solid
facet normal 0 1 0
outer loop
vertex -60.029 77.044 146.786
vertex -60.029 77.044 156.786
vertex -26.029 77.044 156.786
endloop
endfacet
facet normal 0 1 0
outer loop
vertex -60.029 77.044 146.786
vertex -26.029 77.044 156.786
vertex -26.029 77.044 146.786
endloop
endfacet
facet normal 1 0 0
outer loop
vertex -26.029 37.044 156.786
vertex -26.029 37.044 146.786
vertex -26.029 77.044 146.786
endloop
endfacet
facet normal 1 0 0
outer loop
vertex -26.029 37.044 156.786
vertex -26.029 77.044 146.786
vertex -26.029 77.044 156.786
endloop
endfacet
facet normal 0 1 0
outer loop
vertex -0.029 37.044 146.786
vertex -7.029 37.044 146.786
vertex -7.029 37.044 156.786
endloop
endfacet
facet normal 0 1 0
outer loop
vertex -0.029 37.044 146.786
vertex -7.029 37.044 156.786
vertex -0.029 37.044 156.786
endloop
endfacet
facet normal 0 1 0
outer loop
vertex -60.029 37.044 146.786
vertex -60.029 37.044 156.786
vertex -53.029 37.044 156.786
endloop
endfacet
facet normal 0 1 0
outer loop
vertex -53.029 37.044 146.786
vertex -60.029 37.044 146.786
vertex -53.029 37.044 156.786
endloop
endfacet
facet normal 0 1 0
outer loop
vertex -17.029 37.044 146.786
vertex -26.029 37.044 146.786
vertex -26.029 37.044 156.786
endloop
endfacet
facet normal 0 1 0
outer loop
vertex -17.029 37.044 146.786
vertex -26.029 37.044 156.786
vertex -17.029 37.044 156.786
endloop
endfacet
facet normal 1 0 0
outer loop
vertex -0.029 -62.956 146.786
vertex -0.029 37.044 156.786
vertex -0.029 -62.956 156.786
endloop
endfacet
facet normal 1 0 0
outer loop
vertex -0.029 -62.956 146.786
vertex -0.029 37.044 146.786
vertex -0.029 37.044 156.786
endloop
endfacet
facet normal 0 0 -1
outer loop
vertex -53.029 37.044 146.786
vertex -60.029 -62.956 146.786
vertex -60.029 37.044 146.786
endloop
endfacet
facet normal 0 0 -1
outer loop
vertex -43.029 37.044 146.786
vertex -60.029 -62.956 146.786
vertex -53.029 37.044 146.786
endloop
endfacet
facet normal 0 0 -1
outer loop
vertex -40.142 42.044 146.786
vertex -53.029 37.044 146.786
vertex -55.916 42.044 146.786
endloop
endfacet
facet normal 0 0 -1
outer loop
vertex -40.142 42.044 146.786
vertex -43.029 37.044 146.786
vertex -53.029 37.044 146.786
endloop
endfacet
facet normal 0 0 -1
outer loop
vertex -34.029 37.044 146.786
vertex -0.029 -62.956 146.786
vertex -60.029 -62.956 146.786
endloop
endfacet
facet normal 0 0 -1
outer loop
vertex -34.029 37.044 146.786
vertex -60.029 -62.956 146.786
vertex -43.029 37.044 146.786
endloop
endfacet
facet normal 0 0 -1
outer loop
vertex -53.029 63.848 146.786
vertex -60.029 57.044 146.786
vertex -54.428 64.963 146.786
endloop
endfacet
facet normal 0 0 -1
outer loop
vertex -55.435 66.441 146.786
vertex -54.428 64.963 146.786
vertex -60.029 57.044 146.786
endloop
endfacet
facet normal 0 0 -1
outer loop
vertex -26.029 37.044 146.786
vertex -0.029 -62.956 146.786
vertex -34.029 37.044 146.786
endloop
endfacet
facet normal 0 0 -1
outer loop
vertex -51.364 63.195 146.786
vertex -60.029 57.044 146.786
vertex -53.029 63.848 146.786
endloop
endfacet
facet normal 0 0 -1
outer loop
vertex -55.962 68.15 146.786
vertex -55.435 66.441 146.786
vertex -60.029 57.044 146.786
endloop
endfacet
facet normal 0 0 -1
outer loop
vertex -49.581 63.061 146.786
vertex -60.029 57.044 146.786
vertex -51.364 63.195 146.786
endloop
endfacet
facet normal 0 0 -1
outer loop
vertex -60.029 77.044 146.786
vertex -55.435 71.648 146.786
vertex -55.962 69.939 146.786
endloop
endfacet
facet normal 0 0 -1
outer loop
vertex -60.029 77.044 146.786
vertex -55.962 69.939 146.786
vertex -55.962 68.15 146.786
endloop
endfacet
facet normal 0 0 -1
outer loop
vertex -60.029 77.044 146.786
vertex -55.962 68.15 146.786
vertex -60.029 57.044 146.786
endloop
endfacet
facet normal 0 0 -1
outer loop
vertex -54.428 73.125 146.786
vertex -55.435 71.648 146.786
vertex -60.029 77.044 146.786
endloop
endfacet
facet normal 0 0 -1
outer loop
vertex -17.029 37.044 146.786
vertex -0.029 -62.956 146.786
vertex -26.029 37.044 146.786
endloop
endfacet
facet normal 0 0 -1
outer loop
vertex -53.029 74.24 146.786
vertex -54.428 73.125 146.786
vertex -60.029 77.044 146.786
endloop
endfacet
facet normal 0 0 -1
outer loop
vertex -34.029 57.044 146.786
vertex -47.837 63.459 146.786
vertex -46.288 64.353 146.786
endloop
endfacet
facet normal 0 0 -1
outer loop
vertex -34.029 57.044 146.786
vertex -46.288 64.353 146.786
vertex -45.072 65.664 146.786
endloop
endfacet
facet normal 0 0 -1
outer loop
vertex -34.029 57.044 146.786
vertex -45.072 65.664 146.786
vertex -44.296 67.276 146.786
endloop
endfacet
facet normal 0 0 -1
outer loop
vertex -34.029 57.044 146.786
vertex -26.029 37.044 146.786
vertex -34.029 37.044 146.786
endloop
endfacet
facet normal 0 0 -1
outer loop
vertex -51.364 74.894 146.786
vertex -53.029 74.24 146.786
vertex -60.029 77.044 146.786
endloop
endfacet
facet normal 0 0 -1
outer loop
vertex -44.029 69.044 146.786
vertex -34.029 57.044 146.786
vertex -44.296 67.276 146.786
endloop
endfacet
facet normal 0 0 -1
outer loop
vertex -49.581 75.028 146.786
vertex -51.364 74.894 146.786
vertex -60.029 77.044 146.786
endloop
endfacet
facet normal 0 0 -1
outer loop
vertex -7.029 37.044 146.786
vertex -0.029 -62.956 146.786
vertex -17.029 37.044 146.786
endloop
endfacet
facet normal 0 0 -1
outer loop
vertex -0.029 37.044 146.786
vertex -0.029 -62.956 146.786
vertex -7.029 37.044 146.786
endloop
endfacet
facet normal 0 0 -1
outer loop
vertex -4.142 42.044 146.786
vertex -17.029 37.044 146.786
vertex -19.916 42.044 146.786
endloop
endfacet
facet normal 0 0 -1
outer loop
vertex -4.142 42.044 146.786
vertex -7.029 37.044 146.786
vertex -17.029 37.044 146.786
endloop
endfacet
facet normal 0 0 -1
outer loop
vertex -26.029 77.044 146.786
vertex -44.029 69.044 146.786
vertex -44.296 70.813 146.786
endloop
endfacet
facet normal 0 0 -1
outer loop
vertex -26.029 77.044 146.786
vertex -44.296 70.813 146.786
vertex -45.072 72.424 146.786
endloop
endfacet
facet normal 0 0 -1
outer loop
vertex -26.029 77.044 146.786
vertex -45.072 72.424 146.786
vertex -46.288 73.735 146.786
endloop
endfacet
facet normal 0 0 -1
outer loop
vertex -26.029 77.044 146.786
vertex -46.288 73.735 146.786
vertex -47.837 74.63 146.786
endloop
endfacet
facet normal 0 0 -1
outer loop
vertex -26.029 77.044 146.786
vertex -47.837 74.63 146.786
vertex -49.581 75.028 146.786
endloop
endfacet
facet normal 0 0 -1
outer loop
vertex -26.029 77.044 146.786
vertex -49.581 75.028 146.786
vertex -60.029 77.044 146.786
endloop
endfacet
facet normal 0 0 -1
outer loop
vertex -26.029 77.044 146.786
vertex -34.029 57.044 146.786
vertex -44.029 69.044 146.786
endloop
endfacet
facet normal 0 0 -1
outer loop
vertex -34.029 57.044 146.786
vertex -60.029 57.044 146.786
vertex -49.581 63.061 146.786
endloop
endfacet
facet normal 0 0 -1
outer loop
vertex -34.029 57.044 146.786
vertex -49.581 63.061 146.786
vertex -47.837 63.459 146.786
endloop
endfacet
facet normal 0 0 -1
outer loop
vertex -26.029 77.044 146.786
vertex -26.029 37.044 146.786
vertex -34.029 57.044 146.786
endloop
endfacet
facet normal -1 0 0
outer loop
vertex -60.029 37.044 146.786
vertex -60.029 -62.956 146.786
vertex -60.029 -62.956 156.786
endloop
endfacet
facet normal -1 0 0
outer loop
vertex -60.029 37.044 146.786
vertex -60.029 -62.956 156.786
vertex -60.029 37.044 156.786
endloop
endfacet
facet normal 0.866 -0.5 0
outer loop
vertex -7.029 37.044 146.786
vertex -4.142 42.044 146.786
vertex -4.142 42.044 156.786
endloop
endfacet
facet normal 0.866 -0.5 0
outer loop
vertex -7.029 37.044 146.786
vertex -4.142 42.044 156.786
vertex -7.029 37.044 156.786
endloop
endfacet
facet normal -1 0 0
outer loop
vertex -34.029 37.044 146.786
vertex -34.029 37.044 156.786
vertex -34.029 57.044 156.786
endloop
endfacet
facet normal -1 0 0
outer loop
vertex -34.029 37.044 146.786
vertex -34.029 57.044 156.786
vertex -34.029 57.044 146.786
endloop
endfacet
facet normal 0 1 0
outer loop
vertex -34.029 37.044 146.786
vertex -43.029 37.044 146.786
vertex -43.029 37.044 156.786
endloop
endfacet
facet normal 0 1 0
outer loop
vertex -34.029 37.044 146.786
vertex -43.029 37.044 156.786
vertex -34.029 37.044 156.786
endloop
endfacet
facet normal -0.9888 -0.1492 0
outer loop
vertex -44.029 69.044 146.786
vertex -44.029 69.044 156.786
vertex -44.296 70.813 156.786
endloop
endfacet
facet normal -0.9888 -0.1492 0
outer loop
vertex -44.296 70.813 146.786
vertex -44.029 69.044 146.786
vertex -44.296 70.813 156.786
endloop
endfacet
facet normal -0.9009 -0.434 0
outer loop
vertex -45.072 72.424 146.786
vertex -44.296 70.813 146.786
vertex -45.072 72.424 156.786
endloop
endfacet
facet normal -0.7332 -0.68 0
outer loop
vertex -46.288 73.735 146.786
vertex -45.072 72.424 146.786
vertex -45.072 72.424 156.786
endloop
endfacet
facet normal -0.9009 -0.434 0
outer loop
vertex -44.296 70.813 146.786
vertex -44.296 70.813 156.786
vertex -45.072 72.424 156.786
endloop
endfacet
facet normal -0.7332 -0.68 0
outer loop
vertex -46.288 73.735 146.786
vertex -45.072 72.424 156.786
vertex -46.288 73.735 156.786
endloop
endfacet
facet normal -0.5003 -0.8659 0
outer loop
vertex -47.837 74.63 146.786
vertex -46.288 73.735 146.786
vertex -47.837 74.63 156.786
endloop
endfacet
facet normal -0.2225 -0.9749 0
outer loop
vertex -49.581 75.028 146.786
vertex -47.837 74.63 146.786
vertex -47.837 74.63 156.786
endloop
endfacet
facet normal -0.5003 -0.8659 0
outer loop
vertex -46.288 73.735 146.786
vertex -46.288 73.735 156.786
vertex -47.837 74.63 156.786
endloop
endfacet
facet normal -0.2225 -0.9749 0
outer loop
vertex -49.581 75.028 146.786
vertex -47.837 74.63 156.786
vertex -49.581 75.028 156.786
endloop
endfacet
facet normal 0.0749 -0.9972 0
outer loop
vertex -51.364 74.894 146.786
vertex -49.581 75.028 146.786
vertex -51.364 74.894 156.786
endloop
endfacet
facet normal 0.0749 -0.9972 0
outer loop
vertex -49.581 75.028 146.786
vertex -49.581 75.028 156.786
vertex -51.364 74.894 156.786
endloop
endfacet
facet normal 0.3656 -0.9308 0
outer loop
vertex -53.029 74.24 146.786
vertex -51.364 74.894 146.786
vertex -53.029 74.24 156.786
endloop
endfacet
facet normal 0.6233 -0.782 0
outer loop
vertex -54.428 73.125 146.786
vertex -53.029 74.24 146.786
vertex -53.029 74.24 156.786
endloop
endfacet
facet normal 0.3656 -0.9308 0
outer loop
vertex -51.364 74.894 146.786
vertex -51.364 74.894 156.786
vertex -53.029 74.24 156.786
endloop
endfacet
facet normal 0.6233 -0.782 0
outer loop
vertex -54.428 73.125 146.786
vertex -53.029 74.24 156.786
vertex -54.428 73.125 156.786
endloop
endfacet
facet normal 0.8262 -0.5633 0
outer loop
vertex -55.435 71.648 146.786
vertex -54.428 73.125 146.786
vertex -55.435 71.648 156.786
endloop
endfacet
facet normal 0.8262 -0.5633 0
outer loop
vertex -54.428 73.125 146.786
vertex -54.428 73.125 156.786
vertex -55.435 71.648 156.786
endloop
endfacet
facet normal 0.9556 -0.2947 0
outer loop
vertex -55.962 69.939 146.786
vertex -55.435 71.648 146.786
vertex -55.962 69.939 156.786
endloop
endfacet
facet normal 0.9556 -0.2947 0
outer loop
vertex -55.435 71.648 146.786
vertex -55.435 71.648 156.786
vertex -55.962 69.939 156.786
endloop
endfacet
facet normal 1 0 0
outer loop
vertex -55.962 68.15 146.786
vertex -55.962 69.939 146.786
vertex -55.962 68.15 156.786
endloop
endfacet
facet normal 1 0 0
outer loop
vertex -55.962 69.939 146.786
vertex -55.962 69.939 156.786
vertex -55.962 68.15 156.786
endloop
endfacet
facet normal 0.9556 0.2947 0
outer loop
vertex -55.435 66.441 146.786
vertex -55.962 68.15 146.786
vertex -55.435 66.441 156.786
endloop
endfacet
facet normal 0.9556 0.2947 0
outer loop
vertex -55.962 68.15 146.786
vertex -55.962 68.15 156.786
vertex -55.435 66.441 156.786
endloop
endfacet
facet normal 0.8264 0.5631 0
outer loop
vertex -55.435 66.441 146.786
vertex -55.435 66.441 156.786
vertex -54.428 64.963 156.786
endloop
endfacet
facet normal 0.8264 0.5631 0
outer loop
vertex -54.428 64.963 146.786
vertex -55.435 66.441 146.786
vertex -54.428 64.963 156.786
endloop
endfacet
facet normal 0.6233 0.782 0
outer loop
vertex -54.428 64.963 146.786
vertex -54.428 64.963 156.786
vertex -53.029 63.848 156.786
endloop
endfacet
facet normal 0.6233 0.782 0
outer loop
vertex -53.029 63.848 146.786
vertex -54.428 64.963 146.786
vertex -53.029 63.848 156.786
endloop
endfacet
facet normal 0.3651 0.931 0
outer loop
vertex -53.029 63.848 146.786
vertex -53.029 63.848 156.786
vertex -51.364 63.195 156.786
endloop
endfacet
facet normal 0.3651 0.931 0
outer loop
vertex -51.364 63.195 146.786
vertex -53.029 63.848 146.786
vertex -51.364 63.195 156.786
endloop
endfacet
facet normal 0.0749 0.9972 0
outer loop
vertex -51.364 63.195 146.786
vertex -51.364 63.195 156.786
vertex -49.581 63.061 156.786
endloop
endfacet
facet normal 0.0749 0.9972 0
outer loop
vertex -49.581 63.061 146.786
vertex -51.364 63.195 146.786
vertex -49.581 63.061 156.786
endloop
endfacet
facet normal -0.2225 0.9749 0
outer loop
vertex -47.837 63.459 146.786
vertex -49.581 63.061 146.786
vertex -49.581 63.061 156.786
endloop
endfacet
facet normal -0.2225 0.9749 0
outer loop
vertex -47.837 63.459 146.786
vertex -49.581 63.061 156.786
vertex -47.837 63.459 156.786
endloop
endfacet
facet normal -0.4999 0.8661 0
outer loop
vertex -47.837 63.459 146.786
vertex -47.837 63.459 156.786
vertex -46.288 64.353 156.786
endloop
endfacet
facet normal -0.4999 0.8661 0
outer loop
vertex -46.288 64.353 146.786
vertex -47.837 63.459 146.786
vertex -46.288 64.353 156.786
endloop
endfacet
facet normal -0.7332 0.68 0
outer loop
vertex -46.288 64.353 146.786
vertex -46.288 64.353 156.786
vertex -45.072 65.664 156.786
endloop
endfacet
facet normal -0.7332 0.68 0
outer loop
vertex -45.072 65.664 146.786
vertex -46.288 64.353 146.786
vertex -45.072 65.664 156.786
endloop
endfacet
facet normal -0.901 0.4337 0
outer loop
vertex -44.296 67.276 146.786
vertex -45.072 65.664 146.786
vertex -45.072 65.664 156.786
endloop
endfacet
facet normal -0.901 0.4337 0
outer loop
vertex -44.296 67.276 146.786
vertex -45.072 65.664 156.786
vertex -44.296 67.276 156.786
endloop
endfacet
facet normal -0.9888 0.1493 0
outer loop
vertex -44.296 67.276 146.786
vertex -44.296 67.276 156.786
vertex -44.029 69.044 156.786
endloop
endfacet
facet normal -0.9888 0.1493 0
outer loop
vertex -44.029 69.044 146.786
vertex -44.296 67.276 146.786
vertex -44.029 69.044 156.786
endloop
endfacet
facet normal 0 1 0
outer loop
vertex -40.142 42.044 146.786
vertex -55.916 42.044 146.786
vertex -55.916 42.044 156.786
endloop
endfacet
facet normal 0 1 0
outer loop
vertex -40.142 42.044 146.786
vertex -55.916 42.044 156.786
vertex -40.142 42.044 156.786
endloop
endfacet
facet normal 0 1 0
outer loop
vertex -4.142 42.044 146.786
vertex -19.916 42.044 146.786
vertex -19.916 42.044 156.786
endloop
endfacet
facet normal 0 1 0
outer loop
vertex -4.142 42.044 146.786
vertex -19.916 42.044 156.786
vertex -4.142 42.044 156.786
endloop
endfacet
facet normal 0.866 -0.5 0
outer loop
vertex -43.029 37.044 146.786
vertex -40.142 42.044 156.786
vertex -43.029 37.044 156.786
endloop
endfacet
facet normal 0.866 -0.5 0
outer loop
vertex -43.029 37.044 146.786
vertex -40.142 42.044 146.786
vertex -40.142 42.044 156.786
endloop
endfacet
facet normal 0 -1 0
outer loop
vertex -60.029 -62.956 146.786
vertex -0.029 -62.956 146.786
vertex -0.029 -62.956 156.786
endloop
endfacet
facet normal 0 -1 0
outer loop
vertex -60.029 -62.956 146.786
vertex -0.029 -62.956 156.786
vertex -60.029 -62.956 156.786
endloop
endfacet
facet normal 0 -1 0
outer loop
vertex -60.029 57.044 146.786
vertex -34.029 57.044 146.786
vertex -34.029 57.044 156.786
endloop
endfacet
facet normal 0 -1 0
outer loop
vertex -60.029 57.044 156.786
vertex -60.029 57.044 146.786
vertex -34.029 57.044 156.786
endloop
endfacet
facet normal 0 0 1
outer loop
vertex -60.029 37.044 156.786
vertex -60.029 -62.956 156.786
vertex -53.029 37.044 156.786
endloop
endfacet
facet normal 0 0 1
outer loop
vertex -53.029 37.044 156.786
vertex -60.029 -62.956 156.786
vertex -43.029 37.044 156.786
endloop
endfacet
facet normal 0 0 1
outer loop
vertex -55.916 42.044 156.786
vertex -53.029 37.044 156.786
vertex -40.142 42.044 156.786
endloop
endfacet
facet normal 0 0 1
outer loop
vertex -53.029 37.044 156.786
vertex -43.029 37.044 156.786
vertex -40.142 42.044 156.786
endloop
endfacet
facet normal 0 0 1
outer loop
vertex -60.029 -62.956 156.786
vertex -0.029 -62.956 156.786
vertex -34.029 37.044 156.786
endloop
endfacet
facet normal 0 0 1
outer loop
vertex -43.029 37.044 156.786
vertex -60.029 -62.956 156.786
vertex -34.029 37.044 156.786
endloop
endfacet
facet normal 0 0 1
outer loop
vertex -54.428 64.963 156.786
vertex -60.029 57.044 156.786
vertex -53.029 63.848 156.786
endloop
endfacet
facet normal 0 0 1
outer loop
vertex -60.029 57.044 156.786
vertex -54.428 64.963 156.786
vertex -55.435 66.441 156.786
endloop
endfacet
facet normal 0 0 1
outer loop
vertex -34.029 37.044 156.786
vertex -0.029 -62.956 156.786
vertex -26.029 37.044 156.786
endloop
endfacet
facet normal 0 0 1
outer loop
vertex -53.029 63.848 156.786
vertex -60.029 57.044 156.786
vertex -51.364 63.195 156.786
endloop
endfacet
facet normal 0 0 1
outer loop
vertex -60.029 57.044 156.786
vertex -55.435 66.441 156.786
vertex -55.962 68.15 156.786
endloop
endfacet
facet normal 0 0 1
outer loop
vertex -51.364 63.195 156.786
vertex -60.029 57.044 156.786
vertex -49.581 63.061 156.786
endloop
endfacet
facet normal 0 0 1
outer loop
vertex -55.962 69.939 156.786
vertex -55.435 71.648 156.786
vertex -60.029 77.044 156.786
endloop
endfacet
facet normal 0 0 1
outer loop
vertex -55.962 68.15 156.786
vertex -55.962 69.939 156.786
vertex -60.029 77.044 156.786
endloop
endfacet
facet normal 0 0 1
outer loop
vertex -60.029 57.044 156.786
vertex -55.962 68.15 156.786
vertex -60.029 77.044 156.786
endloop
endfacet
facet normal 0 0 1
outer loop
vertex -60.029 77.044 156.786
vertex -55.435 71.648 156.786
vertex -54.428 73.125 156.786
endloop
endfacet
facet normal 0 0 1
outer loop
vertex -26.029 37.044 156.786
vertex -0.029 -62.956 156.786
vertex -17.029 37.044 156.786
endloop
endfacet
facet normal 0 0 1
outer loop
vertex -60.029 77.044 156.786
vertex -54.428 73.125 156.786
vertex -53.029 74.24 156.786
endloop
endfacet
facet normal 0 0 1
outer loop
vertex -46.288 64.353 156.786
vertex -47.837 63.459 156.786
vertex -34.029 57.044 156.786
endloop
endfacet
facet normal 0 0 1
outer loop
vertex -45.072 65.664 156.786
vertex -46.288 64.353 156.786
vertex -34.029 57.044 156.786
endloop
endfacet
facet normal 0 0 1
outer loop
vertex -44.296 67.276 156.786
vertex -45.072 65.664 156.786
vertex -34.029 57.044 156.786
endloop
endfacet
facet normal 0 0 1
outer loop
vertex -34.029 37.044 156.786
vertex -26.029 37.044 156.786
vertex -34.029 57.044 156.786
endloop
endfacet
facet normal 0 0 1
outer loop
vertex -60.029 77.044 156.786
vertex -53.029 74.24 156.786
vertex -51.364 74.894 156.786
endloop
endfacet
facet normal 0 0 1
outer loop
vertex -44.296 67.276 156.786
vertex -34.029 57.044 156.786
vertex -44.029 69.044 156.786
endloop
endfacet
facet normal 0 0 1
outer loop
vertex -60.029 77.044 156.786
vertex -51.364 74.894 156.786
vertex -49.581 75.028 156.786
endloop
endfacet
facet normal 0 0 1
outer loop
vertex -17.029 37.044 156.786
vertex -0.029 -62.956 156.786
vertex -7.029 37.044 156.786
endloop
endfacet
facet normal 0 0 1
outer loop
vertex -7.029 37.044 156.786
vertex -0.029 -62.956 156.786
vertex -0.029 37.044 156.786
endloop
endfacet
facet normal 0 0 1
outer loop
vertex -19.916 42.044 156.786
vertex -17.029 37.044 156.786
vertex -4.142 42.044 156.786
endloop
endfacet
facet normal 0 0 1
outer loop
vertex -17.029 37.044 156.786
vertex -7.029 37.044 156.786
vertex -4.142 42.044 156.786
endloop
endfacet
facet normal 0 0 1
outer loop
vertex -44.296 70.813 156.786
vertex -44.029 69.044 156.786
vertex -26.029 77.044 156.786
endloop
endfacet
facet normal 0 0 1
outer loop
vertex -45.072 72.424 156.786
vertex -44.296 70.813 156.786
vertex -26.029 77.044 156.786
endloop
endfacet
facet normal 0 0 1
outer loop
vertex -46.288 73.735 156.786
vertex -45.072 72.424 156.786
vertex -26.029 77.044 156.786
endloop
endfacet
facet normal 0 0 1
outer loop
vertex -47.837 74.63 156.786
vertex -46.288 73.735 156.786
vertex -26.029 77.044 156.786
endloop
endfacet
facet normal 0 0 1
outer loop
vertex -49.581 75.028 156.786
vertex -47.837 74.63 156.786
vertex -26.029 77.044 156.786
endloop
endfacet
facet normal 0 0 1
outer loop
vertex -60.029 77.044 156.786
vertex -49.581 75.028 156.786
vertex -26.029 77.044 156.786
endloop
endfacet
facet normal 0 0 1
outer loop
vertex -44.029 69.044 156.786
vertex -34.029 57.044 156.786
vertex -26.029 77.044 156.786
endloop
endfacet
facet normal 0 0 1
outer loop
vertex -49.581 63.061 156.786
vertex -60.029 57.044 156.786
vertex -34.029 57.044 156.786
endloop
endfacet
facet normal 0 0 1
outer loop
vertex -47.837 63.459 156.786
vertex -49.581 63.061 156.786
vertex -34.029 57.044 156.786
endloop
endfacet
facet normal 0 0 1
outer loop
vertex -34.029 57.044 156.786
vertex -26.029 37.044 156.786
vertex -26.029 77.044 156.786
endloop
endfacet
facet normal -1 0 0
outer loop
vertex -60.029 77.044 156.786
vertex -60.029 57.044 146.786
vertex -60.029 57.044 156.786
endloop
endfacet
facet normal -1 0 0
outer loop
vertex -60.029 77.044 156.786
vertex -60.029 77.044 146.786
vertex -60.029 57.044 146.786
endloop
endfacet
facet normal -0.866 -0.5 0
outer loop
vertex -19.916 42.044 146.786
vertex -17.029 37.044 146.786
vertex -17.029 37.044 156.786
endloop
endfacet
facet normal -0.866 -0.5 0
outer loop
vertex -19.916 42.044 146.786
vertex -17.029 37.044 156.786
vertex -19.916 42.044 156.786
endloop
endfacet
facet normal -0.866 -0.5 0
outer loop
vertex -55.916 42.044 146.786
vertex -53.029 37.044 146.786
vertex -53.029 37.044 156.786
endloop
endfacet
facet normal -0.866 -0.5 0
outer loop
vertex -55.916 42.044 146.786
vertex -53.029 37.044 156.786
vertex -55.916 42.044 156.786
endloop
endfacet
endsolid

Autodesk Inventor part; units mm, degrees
ref_plane "YZ Plane" through (0, 0, 0) normal (1, 0, 0) x (0, 1, 0)
ref_plane "XZ Plane" through (0, 0, 0) normal (0, 1, 0) x (-1, 0, 0)
ref_plane "Work Plane1" through (-60.0293, 37.0443, 146.7859) normal (0, 0, 1) x (1, 0, 0)
sketch "Sketch1" plane through (-60.0293, 37.0443, 146.7859) normal (0, 0, 1) x (1, 0, 0)
  line L0 (55.8868, 5) -> (53, 0) projected
  line L1 (53, 0) -> (60, 0) projected
  line L2 (60, 0) -> (60, 10) projected
  line L3 (20, 10) -> (60, 10) projected
  line L4 (20, 10) -> (20, 40) projected
  line L5 (0, 40) -> (20, 40) projected
  line L6 (0, 0) -> (0, 40) projected
  line L7 (0, 0) -> (7, 0) projected
  line L8 (7, 0) -> (4.1132, 5) projected
  line L9 (4.1132, 5) -> (19.8868, 5) projected
  line L10 (19.8868, 5) -> (17, 0) projected
  line L11 (17, 0) -> (43, 0) projected
  line L12 (43, 0) -> (40.1132, 5) projected
  line L13 (40.1132, 5) -> (55.8868, 5) projected
  circle A0 centre (10, 32) radius 6 projected
  line L14 (0, 0) -> (60, 0)
  line L15 (60, 0) -> (60, -100)
  line L16 (60, -100) -> (0, -100)
  line L17 (0, -100) -> (0, 0)
  point P0 (60.0293, -37.0443)
  dimension "d0" = 60
  dimension "d1" = 100
extrude "Extrusion1" add sketch "Sketch1" along normal blind 10 contours L0 L14 L12 L13 | L1 L15 L16 L17 L7 L14 L11 | L14 L8 L9 L10
sketch "Sketch2" plane through (-43.0293, 37.0443, 146.7859) normal (0, 1, 0) x (1, 0, 0)
  line L0 (17, -10) -> (9, -10)
  line L1 (9, -10) -> (9, 0)
  line L2 (9, 0) -> (17, 0)
  line L3 (17, 0) -> (17, -10)
  line L4 (17, -10) -> (9, 0) construction
  line L5 (9, -10) -> (17, 0) construction
  line L6 (55.0352, 0) -> (-29.0059, 0) projected
  line L7 (43, 0) -> (43, -10) projected
  point P0 (43.0293, 146.7859)
  point P1 (13, -5)
  dimension "d4" = 8
  dimension "d5" = 10
  dimension "d6" = 0
  dimension "d9" = 30
extrude "Extrusion2" add sketch "Sketch2" along normal up to surface (40 mm away)
sketch "Sketch3" plane through (-34.0293, 37.0443, 146.7859) normal (-1, 0, 0) x (0, 0, 1)
  line L0 (10, 40) -> (0, 40) projected
  line L1 (0, 0) -> (0, 40) projected
  line L2 (10, 0) -> (0, 0) projected
  line L3 (10, 0) -> (10, 40) projected
  line L4 (0, 0) -> (0, 40) projected
  line L5 (0, 20) -> (10, 20)
  point P0 (-146.7859, -37.0443)
  point P1 (0, 20)
  dimension "d10" = 20
ref_plane "Work Plane2" through (-60.0293, 37.0443, -153.2141) normal (-1, 0, 0) x (0, 0, 1)
extrude "Extrusion3" add sketch "Sketch3" along normal up to surface (26 mm away) contours L3 L5 L1 L0
sketch "Sketch4" plane through (-60.0293, 37.0443, 156.7859) normal (0, 0, 1) x (1, 0, 0)
  circle A0 centre (10, 32) radius 6 projected
  point P0 (60.0293, -37.0443)
extrude "Extrusion4" cut sketch "Sketch4" against normal through all
thread "Thread1" size "M8x1.25" class "6H" standard "ANSI Metric M Profile" length 140
properties part number "jaws"
